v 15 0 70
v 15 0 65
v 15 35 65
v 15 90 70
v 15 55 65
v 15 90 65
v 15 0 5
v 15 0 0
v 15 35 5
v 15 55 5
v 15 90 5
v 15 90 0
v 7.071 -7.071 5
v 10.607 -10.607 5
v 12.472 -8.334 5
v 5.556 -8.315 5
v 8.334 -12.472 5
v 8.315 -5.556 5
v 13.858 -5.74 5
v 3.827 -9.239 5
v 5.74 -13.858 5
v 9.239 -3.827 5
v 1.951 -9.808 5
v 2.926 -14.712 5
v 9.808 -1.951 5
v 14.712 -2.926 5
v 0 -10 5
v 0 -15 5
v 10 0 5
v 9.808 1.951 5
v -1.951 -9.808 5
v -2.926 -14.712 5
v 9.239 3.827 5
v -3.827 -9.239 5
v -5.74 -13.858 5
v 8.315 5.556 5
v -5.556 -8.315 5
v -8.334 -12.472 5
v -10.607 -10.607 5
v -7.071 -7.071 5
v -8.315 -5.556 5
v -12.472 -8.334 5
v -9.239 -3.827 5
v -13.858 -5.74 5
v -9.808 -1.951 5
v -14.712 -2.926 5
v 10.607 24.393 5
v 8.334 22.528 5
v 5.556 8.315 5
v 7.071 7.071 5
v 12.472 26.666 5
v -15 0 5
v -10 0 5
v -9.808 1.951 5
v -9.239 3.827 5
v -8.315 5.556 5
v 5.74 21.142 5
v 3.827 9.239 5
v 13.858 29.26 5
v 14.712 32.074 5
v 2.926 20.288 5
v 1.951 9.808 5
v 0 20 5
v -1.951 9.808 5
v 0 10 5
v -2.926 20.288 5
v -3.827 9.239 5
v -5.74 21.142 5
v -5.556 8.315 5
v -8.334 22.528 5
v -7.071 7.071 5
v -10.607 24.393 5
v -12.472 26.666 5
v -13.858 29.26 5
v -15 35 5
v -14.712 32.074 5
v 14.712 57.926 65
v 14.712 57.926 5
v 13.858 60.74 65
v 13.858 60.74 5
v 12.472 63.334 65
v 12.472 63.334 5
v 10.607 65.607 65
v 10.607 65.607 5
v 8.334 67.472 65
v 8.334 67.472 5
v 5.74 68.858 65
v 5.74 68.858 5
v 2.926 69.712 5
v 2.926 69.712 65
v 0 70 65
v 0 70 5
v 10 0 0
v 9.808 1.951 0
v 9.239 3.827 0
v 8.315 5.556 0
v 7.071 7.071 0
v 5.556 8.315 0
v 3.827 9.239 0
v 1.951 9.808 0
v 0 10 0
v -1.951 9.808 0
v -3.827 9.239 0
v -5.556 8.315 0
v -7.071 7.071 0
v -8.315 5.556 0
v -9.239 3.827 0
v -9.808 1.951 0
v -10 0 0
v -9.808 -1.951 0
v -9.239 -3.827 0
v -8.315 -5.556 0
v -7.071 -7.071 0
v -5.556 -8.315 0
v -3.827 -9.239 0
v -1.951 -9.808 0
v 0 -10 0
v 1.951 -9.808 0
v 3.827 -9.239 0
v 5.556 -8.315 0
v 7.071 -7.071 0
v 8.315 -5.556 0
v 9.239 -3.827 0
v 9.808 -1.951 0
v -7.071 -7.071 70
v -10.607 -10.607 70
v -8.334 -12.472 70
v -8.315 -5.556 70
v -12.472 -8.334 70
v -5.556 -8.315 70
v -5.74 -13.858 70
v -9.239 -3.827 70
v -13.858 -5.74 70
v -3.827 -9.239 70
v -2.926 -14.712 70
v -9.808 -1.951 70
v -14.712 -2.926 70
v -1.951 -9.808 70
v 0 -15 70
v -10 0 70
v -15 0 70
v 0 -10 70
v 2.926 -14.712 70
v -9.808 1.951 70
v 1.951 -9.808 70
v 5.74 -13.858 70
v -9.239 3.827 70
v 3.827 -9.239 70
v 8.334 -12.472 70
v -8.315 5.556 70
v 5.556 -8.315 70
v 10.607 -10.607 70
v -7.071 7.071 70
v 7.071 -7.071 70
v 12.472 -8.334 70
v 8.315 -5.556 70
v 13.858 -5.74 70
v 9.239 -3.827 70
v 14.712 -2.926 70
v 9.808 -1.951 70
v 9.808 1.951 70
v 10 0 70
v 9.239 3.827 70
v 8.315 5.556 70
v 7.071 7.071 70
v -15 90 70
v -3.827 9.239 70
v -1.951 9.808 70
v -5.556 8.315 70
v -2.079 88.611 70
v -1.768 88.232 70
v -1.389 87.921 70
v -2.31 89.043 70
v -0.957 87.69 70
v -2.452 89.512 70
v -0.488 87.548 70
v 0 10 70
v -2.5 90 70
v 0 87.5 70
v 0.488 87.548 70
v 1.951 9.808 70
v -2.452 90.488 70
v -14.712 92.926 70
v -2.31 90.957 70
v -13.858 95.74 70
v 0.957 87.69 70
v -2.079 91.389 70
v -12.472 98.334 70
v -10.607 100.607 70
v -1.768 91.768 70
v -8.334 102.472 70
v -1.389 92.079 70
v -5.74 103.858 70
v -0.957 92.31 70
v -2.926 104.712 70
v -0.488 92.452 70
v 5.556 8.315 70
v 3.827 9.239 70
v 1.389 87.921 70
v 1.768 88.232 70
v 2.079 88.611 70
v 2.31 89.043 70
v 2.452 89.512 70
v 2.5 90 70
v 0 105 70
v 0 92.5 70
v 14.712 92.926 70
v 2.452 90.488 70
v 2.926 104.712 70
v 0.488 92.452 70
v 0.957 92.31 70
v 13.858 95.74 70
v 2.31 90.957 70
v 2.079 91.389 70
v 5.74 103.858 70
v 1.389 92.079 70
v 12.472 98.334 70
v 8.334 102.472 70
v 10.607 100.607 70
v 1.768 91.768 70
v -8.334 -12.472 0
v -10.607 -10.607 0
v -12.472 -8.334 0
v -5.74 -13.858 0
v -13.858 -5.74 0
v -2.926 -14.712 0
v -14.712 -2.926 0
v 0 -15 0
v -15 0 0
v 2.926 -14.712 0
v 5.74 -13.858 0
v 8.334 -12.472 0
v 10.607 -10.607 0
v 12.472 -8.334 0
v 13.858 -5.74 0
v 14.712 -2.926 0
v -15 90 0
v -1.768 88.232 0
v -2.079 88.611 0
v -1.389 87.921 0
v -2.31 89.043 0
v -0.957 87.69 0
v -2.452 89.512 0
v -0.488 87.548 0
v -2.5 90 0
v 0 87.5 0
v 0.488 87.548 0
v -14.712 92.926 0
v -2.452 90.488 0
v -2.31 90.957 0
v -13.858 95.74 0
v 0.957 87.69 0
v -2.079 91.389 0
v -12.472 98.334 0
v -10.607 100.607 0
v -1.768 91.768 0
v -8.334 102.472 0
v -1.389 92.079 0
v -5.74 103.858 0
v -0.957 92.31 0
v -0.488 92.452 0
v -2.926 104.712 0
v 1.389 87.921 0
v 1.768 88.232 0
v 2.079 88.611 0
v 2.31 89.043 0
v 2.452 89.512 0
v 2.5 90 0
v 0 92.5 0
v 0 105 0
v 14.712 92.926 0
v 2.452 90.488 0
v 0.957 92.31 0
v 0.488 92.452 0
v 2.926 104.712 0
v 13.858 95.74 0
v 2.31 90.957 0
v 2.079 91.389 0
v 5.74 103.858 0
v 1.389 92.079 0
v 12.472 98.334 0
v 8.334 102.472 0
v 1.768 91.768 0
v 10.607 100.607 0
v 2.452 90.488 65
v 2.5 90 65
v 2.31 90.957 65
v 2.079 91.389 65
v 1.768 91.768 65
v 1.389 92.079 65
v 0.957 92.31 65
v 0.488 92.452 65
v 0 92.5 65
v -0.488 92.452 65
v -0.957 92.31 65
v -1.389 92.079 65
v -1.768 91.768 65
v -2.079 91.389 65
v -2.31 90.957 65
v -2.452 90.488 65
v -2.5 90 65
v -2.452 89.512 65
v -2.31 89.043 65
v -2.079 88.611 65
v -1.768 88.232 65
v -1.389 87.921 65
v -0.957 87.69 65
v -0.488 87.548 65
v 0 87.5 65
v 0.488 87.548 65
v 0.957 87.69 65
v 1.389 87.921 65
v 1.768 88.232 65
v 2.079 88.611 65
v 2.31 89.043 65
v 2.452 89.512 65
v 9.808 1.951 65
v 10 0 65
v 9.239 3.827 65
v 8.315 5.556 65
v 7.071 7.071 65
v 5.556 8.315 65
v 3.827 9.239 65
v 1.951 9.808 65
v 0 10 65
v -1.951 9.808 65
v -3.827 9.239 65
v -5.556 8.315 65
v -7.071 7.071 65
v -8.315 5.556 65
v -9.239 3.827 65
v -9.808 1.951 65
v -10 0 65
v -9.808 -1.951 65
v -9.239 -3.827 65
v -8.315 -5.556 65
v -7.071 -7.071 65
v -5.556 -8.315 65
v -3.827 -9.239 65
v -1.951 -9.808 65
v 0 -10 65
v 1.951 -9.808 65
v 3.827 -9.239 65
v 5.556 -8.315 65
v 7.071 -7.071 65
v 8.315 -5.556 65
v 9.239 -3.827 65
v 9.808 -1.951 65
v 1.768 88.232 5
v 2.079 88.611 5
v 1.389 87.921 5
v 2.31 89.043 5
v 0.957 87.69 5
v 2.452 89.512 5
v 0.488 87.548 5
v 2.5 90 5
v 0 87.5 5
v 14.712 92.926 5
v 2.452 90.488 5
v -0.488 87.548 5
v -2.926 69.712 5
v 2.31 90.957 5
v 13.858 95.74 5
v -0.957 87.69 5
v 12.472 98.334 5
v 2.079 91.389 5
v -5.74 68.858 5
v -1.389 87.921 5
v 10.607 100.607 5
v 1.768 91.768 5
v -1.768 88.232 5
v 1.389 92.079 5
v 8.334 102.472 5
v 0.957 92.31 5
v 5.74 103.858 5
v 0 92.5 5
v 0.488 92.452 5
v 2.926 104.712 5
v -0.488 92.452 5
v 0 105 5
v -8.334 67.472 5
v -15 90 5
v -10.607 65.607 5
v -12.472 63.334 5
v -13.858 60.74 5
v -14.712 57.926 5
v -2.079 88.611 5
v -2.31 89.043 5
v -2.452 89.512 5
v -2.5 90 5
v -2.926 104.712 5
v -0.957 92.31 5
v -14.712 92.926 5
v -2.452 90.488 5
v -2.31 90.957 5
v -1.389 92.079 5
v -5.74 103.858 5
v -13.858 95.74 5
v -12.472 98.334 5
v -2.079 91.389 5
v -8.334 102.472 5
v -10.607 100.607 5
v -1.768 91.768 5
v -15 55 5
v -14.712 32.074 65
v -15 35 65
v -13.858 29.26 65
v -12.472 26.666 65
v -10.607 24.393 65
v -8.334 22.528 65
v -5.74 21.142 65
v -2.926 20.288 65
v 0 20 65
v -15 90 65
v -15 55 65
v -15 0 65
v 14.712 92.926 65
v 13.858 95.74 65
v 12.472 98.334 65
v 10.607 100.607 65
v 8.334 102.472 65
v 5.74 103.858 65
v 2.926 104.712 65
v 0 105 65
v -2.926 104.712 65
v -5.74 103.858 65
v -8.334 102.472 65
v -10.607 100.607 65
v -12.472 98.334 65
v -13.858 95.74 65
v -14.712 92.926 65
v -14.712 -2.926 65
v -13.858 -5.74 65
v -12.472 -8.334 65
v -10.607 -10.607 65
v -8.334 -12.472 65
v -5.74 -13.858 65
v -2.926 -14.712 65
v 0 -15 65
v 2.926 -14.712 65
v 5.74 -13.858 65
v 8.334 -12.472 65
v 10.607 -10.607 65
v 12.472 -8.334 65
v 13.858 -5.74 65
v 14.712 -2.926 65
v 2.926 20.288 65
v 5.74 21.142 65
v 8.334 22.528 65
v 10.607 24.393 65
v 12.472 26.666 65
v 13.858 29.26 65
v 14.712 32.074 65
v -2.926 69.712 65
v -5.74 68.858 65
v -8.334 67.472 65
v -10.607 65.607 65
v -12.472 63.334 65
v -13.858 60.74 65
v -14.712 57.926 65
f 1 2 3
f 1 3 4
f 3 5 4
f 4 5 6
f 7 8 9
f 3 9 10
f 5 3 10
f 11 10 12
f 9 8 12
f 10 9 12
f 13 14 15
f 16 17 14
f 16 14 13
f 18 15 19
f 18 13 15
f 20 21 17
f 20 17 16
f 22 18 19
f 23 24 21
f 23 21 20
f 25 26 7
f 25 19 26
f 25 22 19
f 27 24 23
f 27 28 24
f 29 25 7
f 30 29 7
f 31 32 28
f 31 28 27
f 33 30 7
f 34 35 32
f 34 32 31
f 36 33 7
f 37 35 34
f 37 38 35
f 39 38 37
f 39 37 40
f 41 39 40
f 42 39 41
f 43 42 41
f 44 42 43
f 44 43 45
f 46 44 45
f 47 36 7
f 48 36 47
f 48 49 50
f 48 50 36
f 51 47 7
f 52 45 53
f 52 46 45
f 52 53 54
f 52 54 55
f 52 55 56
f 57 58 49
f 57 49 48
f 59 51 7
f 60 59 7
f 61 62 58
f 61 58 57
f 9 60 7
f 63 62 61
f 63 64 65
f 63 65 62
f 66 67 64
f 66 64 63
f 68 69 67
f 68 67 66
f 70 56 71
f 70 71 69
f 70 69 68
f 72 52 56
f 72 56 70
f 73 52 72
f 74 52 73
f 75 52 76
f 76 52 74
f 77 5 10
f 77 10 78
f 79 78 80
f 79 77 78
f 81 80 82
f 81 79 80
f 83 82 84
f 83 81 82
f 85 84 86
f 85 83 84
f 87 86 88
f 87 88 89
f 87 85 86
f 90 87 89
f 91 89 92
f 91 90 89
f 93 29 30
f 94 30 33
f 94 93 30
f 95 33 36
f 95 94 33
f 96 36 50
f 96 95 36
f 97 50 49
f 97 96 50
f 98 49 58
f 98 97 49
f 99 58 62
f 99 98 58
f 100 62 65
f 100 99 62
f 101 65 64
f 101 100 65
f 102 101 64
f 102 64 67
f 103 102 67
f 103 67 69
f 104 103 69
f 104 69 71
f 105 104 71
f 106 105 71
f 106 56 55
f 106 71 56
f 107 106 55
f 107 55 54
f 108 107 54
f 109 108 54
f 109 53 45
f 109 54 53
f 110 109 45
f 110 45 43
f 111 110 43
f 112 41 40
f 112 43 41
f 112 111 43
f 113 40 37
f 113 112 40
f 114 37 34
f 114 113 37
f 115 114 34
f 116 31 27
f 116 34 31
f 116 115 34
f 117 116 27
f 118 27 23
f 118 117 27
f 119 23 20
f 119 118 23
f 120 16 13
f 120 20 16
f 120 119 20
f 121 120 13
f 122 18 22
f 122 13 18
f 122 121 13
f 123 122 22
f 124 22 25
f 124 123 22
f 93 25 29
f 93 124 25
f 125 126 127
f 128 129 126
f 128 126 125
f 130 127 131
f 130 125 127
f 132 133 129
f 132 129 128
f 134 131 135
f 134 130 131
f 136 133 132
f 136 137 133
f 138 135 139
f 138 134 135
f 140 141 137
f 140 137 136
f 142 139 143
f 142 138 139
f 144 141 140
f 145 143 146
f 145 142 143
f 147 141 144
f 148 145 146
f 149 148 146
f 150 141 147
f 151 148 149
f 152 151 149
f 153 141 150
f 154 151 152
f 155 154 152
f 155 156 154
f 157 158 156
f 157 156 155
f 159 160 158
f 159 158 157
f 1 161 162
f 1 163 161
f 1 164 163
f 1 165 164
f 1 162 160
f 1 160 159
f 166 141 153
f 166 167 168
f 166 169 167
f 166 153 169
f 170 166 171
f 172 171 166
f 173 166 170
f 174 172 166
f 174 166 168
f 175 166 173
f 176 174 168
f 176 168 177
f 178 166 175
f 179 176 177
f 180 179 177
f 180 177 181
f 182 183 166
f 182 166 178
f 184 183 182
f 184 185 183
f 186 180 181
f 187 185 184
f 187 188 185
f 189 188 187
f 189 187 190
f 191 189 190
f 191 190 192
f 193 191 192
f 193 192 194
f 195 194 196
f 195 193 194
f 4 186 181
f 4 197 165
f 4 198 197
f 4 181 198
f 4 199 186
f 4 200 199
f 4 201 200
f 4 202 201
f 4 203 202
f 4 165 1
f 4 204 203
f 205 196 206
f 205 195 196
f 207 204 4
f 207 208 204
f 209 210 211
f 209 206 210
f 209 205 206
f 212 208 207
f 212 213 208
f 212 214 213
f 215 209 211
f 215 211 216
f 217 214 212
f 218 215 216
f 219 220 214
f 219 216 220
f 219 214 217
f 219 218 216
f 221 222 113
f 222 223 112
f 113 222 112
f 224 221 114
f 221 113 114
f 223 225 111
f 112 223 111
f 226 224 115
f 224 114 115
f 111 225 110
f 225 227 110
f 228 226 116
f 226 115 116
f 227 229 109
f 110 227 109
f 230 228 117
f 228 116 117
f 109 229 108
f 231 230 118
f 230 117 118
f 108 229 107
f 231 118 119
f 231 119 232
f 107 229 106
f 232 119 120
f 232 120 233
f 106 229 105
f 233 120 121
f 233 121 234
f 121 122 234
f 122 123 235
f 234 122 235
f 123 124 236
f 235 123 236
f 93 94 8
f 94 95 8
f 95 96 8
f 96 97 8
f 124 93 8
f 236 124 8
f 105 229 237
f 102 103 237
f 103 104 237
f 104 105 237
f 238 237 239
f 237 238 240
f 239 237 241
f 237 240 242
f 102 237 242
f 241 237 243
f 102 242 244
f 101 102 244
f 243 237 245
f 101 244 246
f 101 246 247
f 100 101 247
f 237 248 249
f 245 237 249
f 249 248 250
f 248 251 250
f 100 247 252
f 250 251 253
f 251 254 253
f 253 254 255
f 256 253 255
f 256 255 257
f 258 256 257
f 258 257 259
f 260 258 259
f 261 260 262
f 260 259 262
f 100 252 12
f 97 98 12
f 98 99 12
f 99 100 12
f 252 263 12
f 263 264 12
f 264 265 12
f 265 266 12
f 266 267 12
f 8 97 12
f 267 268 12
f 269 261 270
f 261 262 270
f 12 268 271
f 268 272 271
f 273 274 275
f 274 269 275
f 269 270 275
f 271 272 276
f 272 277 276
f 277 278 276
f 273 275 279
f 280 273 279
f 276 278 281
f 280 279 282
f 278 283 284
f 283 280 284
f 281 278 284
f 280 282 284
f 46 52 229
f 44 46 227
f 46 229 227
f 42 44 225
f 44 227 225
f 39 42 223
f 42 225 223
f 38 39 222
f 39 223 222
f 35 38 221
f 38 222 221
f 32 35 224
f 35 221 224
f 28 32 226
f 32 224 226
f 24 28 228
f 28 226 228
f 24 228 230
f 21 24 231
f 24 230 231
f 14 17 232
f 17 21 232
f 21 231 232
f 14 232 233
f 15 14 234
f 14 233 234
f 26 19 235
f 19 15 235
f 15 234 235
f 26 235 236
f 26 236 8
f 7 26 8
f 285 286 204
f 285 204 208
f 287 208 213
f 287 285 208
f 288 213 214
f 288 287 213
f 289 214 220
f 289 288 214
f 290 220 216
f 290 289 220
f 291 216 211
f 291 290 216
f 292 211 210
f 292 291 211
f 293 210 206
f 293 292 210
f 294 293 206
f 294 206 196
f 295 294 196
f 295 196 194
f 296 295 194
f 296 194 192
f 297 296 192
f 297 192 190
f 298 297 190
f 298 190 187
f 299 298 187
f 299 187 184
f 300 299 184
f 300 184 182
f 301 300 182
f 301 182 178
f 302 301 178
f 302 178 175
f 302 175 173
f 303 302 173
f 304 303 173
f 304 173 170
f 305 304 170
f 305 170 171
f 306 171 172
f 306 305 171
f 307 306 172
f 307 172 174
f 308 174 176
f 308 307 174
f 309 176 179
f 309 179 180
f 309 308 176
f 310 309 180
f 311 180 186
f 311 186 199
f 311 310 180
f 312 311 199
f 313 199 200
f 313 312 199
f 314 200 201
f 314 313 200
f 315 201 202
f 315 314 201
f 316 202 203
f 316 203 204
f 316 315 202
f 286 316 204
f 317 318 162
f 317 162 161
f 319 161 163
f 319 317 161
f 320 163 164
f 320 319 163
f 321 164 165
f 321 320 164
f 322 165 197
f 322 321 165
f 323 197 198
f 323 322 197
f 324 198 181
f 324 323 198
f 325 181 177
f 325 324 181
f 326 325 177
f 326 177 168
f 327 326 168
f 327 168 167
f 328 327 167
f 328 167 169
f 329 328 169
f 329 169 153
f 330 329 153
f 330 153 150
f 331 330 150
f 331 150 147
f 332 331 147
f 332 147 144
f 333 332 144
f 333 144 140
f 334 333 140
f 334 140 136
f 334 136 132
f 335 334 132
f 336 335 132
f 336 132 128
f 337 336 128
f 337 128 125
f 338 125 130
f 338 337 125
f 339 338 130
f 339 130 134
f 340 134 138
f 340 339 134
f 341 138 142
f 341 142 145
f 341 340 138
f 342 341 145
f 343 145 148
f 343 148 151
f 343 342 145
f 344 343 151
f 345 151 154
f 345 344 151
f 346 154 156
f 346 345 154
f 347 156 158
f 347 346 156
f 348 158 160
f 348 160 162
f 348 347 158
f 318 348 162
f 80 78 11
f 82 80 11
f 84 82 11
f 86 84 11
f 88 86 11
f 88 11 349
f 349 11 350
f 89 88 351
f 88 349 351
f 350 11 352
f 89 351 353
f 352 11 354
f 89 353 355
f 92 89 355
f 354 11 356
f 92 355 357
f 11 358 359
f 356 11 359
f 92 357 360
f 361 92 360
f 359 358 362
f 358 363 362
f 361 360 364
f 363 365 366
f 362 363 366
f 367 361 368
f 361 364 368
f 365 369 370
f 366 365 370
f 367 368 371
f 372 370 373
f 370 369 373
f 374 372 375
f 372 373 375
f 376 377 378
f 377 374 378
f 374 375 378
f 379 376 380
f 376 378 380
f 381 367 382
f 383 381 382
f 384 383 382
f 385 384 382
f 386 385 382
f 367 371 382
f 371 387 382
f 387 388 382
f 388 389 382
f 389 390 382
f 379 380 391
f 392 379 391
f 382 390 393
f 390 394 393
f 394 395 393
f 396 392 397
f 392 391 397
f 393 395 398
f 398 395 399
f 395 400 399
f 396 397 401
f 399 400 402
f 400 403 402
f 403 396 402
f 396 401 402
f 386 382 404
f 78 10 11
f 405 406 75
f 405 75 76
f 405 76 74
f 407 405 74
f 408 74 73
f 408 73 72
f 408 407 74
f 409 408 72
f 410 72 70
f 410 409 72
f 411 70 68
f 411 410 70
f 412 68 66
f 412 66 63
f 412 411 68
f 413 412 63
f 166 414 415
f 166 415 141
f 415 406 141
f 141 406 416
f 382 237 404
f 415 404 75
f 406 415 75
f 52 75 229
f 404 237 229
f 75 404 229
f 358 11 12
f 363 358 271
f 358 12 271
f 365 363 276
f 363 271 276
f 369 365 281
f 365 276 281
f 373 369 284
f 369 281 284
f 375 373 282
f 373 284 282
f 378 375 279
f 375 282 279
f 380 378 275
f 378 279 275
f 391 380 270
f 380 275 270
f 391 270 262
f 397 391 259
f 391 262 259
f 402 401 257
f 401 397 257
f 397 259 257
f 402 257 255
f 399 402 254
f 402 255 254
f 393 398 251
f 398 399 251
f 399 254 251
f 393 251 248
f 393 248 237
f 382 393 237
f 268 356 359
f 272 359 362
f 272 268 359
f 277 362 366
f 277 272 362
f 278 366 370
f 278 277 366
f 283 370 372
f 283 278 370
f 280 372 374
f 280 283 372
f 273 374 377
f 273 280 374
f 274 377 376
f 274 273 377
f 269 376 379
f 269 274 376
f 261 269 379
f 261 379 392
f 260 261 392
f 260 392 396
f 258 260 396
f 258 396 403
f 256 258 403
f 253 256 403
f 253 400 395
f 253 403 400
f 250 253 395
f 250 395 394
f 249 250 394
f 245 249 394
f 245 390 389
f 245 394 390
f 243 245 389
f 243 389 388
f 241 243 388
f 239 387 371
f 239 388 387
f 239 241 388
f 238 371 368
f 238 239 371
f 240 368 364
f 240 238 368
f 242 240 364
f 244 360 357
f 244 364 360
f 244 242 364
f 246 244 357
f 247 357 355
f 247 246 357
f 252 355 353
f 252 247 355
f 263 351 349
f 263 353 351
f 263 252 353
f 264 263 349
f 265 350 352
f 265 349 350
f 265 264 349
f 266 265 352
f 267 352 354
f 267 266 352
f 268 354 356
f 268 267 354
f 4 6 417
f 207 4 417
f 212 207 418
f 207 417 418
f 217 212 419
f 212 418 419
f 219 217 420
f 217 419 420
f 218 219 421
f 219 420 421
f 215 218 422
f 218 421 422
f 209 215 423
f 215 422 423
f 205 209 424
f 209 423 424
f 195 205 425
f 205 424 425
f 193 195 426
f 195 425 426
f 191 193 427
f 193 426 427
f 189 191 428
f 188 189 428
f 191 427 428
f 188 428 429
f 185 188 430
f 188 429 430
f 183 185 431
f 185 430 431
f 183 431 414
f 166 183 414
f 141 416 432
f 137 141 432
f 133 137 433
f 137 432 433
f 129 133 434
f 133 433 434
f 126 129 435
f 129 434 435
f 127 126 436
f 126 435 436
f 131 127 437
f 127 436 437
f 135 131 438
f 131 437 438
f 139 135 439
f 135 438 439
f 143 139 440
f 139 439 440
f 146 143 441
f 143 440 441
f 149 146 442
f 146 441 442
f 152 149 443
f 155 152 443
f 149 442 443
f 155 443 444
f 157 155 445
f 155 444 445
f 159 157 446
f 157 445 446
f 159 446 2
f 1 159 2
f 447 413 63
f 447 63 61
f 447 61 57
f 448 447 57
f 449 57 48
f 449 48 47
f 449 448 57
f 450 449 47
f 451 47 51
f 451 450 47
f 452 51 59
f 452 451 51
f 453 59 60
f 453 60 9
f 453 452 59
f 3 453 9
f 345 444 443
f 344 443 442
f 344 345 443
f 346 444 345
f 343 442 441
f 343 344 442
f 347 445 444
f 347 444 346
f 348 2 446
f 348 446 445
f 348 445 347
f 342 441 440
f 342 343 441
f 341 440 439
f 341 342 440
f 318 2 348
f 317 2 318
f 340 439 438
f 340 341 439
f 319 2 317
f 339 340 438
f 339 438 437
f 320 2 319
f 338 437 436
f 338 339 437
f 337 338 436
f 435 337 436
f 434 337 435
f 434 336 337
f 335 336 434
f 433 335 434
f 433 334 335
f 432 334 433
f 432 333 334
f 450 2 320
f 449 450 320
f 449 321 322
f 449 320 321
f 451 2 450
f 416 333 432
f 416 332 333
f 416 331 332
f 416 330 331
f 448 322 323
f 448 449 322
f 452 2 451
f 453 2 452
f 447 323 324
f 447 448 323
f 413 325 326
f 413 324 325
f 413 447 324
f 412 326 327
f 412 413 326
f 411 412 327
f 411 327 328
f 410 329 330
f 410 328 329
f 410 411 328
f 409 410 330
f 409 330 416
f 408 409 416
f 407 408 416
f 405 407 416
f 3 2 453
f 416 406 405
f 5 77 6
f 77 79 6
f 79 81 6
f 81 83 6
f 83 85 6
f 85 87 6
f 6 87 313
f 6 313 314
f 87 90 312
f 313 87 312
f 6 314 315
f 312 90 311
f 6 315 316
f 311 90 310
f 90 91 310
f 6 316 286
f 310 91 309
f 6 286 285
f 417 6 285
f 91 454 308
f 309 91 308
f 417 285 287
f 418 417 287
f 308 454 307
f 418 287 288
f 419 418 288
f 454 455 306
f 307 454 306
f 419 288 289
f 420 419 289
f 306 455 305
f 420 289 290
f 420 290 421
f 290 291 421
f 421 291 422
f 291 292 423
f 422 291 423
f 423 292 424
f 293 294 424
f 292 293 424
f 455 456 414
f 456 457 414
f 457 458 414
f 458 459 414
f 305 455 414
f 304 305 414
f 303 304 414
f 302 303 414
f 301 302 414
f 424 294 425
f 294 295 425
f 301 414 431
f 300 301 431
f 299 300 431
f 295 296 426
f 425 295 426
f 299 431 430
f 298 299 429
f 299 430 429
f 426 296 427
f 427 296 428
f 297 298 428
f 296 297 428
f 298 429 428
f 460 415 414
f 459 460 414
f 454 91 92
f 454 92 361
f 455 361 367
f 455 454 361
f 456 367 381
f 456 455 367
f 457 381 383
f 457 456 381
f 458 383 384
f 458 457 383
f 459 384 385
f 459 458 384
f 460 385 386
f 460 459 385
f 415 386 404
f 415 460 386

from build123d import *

# Parameters (mm, degrees)
SKETCH_1_R          = 10
SKETCH_1_R_2        = 2.5
EXTRUDE_1_DEPTH     = 70
SKETCH_2_W          = 60
SKETCH_2_H          = 40
SKETCH_2_H_2        = 50
CUT_EXTRUDE_1_DEPTH = 70
CUT_EXTRUDE_2_DEPTH = 60


with BuildPart() as part:
    # 草图1 → 凸台-拉伸1 (new body)
    with BuildSketch(Plane.XY):
        with BuildLine():
            Line((-15, 90), (-15, 0))
            ThreePointArc((-15, 0), (0, -15), (15, 0))
            Line((15, 0), (15, 90))
            ThreePointArc((15, 90), (0, 105), (-15, 90))
        make_face()
        Circle(SKETCH_1_R, mode=Mode.SUBTRACT)
        with Locations((0, 90)):
            Circle(SKETCH_1_R_2, mode=Mode.SUBTRACT)
    extrude(amount=EXTRUDE_1_DEPTH)

    # 草图2 → 切除-拉伸1 (cut)
    with BuildSketch(Plane.ZY.offset(15)):
        with Locations((35, 0)):
            Rectangle(SKETCH_2_W, SKETCH_2_H)
        with Locations((35, 95)):
            Rectangle(SKETCH_2_W, SKETCH_2_H_2)
    extrude(amount=-CUT_EXTRUDE_1_DEPTH, mode=Mode.SUBTRACT)

    # 草图3 → 切除-拉伸2 (cut)
    with BuildSketch(Plane(origin=(0, 0, 65), x_dir=(-1, 0, 0), z_dir=(0, 0, -1))):
        with BuildLine():
            Line((15, 55), (15, 70))
            Line((15, 70), (1.38e-07, 70))
            ThreePointArc((1.38e-07, 70), (10.606601767, 65.606601669), (15, 55))
        make_face()
        with BuildLine():
            ThreePointArc((-15, 55), (-10.606601669, 65.606601767), (1.38e-07, 70))
            Line((1.38e-07, 70), (-15, 70))
            Line((-15, 70), (-15, 55))
        make_face()
        with BuildLine():
            ThreePointArc((0, 20), (-10.606601718, 24.393398282), (-15, 35))
            Line((-15, 35), (-15, 20))
            Line((-15, 20), (0, 20))
        make_face()
        with BuildLine():
            ThreePointArc((15, 35), (10.606601718, 24.393398282), (0, 20))
            Line((0, 20), (15, 20))
            Line((15, 20), (15, 35))
        make_face()
    extrude(amount=CUT_EXTRUDE_2_DEPTH, mode=Mode.SUBTRACT)


solid = part.part
